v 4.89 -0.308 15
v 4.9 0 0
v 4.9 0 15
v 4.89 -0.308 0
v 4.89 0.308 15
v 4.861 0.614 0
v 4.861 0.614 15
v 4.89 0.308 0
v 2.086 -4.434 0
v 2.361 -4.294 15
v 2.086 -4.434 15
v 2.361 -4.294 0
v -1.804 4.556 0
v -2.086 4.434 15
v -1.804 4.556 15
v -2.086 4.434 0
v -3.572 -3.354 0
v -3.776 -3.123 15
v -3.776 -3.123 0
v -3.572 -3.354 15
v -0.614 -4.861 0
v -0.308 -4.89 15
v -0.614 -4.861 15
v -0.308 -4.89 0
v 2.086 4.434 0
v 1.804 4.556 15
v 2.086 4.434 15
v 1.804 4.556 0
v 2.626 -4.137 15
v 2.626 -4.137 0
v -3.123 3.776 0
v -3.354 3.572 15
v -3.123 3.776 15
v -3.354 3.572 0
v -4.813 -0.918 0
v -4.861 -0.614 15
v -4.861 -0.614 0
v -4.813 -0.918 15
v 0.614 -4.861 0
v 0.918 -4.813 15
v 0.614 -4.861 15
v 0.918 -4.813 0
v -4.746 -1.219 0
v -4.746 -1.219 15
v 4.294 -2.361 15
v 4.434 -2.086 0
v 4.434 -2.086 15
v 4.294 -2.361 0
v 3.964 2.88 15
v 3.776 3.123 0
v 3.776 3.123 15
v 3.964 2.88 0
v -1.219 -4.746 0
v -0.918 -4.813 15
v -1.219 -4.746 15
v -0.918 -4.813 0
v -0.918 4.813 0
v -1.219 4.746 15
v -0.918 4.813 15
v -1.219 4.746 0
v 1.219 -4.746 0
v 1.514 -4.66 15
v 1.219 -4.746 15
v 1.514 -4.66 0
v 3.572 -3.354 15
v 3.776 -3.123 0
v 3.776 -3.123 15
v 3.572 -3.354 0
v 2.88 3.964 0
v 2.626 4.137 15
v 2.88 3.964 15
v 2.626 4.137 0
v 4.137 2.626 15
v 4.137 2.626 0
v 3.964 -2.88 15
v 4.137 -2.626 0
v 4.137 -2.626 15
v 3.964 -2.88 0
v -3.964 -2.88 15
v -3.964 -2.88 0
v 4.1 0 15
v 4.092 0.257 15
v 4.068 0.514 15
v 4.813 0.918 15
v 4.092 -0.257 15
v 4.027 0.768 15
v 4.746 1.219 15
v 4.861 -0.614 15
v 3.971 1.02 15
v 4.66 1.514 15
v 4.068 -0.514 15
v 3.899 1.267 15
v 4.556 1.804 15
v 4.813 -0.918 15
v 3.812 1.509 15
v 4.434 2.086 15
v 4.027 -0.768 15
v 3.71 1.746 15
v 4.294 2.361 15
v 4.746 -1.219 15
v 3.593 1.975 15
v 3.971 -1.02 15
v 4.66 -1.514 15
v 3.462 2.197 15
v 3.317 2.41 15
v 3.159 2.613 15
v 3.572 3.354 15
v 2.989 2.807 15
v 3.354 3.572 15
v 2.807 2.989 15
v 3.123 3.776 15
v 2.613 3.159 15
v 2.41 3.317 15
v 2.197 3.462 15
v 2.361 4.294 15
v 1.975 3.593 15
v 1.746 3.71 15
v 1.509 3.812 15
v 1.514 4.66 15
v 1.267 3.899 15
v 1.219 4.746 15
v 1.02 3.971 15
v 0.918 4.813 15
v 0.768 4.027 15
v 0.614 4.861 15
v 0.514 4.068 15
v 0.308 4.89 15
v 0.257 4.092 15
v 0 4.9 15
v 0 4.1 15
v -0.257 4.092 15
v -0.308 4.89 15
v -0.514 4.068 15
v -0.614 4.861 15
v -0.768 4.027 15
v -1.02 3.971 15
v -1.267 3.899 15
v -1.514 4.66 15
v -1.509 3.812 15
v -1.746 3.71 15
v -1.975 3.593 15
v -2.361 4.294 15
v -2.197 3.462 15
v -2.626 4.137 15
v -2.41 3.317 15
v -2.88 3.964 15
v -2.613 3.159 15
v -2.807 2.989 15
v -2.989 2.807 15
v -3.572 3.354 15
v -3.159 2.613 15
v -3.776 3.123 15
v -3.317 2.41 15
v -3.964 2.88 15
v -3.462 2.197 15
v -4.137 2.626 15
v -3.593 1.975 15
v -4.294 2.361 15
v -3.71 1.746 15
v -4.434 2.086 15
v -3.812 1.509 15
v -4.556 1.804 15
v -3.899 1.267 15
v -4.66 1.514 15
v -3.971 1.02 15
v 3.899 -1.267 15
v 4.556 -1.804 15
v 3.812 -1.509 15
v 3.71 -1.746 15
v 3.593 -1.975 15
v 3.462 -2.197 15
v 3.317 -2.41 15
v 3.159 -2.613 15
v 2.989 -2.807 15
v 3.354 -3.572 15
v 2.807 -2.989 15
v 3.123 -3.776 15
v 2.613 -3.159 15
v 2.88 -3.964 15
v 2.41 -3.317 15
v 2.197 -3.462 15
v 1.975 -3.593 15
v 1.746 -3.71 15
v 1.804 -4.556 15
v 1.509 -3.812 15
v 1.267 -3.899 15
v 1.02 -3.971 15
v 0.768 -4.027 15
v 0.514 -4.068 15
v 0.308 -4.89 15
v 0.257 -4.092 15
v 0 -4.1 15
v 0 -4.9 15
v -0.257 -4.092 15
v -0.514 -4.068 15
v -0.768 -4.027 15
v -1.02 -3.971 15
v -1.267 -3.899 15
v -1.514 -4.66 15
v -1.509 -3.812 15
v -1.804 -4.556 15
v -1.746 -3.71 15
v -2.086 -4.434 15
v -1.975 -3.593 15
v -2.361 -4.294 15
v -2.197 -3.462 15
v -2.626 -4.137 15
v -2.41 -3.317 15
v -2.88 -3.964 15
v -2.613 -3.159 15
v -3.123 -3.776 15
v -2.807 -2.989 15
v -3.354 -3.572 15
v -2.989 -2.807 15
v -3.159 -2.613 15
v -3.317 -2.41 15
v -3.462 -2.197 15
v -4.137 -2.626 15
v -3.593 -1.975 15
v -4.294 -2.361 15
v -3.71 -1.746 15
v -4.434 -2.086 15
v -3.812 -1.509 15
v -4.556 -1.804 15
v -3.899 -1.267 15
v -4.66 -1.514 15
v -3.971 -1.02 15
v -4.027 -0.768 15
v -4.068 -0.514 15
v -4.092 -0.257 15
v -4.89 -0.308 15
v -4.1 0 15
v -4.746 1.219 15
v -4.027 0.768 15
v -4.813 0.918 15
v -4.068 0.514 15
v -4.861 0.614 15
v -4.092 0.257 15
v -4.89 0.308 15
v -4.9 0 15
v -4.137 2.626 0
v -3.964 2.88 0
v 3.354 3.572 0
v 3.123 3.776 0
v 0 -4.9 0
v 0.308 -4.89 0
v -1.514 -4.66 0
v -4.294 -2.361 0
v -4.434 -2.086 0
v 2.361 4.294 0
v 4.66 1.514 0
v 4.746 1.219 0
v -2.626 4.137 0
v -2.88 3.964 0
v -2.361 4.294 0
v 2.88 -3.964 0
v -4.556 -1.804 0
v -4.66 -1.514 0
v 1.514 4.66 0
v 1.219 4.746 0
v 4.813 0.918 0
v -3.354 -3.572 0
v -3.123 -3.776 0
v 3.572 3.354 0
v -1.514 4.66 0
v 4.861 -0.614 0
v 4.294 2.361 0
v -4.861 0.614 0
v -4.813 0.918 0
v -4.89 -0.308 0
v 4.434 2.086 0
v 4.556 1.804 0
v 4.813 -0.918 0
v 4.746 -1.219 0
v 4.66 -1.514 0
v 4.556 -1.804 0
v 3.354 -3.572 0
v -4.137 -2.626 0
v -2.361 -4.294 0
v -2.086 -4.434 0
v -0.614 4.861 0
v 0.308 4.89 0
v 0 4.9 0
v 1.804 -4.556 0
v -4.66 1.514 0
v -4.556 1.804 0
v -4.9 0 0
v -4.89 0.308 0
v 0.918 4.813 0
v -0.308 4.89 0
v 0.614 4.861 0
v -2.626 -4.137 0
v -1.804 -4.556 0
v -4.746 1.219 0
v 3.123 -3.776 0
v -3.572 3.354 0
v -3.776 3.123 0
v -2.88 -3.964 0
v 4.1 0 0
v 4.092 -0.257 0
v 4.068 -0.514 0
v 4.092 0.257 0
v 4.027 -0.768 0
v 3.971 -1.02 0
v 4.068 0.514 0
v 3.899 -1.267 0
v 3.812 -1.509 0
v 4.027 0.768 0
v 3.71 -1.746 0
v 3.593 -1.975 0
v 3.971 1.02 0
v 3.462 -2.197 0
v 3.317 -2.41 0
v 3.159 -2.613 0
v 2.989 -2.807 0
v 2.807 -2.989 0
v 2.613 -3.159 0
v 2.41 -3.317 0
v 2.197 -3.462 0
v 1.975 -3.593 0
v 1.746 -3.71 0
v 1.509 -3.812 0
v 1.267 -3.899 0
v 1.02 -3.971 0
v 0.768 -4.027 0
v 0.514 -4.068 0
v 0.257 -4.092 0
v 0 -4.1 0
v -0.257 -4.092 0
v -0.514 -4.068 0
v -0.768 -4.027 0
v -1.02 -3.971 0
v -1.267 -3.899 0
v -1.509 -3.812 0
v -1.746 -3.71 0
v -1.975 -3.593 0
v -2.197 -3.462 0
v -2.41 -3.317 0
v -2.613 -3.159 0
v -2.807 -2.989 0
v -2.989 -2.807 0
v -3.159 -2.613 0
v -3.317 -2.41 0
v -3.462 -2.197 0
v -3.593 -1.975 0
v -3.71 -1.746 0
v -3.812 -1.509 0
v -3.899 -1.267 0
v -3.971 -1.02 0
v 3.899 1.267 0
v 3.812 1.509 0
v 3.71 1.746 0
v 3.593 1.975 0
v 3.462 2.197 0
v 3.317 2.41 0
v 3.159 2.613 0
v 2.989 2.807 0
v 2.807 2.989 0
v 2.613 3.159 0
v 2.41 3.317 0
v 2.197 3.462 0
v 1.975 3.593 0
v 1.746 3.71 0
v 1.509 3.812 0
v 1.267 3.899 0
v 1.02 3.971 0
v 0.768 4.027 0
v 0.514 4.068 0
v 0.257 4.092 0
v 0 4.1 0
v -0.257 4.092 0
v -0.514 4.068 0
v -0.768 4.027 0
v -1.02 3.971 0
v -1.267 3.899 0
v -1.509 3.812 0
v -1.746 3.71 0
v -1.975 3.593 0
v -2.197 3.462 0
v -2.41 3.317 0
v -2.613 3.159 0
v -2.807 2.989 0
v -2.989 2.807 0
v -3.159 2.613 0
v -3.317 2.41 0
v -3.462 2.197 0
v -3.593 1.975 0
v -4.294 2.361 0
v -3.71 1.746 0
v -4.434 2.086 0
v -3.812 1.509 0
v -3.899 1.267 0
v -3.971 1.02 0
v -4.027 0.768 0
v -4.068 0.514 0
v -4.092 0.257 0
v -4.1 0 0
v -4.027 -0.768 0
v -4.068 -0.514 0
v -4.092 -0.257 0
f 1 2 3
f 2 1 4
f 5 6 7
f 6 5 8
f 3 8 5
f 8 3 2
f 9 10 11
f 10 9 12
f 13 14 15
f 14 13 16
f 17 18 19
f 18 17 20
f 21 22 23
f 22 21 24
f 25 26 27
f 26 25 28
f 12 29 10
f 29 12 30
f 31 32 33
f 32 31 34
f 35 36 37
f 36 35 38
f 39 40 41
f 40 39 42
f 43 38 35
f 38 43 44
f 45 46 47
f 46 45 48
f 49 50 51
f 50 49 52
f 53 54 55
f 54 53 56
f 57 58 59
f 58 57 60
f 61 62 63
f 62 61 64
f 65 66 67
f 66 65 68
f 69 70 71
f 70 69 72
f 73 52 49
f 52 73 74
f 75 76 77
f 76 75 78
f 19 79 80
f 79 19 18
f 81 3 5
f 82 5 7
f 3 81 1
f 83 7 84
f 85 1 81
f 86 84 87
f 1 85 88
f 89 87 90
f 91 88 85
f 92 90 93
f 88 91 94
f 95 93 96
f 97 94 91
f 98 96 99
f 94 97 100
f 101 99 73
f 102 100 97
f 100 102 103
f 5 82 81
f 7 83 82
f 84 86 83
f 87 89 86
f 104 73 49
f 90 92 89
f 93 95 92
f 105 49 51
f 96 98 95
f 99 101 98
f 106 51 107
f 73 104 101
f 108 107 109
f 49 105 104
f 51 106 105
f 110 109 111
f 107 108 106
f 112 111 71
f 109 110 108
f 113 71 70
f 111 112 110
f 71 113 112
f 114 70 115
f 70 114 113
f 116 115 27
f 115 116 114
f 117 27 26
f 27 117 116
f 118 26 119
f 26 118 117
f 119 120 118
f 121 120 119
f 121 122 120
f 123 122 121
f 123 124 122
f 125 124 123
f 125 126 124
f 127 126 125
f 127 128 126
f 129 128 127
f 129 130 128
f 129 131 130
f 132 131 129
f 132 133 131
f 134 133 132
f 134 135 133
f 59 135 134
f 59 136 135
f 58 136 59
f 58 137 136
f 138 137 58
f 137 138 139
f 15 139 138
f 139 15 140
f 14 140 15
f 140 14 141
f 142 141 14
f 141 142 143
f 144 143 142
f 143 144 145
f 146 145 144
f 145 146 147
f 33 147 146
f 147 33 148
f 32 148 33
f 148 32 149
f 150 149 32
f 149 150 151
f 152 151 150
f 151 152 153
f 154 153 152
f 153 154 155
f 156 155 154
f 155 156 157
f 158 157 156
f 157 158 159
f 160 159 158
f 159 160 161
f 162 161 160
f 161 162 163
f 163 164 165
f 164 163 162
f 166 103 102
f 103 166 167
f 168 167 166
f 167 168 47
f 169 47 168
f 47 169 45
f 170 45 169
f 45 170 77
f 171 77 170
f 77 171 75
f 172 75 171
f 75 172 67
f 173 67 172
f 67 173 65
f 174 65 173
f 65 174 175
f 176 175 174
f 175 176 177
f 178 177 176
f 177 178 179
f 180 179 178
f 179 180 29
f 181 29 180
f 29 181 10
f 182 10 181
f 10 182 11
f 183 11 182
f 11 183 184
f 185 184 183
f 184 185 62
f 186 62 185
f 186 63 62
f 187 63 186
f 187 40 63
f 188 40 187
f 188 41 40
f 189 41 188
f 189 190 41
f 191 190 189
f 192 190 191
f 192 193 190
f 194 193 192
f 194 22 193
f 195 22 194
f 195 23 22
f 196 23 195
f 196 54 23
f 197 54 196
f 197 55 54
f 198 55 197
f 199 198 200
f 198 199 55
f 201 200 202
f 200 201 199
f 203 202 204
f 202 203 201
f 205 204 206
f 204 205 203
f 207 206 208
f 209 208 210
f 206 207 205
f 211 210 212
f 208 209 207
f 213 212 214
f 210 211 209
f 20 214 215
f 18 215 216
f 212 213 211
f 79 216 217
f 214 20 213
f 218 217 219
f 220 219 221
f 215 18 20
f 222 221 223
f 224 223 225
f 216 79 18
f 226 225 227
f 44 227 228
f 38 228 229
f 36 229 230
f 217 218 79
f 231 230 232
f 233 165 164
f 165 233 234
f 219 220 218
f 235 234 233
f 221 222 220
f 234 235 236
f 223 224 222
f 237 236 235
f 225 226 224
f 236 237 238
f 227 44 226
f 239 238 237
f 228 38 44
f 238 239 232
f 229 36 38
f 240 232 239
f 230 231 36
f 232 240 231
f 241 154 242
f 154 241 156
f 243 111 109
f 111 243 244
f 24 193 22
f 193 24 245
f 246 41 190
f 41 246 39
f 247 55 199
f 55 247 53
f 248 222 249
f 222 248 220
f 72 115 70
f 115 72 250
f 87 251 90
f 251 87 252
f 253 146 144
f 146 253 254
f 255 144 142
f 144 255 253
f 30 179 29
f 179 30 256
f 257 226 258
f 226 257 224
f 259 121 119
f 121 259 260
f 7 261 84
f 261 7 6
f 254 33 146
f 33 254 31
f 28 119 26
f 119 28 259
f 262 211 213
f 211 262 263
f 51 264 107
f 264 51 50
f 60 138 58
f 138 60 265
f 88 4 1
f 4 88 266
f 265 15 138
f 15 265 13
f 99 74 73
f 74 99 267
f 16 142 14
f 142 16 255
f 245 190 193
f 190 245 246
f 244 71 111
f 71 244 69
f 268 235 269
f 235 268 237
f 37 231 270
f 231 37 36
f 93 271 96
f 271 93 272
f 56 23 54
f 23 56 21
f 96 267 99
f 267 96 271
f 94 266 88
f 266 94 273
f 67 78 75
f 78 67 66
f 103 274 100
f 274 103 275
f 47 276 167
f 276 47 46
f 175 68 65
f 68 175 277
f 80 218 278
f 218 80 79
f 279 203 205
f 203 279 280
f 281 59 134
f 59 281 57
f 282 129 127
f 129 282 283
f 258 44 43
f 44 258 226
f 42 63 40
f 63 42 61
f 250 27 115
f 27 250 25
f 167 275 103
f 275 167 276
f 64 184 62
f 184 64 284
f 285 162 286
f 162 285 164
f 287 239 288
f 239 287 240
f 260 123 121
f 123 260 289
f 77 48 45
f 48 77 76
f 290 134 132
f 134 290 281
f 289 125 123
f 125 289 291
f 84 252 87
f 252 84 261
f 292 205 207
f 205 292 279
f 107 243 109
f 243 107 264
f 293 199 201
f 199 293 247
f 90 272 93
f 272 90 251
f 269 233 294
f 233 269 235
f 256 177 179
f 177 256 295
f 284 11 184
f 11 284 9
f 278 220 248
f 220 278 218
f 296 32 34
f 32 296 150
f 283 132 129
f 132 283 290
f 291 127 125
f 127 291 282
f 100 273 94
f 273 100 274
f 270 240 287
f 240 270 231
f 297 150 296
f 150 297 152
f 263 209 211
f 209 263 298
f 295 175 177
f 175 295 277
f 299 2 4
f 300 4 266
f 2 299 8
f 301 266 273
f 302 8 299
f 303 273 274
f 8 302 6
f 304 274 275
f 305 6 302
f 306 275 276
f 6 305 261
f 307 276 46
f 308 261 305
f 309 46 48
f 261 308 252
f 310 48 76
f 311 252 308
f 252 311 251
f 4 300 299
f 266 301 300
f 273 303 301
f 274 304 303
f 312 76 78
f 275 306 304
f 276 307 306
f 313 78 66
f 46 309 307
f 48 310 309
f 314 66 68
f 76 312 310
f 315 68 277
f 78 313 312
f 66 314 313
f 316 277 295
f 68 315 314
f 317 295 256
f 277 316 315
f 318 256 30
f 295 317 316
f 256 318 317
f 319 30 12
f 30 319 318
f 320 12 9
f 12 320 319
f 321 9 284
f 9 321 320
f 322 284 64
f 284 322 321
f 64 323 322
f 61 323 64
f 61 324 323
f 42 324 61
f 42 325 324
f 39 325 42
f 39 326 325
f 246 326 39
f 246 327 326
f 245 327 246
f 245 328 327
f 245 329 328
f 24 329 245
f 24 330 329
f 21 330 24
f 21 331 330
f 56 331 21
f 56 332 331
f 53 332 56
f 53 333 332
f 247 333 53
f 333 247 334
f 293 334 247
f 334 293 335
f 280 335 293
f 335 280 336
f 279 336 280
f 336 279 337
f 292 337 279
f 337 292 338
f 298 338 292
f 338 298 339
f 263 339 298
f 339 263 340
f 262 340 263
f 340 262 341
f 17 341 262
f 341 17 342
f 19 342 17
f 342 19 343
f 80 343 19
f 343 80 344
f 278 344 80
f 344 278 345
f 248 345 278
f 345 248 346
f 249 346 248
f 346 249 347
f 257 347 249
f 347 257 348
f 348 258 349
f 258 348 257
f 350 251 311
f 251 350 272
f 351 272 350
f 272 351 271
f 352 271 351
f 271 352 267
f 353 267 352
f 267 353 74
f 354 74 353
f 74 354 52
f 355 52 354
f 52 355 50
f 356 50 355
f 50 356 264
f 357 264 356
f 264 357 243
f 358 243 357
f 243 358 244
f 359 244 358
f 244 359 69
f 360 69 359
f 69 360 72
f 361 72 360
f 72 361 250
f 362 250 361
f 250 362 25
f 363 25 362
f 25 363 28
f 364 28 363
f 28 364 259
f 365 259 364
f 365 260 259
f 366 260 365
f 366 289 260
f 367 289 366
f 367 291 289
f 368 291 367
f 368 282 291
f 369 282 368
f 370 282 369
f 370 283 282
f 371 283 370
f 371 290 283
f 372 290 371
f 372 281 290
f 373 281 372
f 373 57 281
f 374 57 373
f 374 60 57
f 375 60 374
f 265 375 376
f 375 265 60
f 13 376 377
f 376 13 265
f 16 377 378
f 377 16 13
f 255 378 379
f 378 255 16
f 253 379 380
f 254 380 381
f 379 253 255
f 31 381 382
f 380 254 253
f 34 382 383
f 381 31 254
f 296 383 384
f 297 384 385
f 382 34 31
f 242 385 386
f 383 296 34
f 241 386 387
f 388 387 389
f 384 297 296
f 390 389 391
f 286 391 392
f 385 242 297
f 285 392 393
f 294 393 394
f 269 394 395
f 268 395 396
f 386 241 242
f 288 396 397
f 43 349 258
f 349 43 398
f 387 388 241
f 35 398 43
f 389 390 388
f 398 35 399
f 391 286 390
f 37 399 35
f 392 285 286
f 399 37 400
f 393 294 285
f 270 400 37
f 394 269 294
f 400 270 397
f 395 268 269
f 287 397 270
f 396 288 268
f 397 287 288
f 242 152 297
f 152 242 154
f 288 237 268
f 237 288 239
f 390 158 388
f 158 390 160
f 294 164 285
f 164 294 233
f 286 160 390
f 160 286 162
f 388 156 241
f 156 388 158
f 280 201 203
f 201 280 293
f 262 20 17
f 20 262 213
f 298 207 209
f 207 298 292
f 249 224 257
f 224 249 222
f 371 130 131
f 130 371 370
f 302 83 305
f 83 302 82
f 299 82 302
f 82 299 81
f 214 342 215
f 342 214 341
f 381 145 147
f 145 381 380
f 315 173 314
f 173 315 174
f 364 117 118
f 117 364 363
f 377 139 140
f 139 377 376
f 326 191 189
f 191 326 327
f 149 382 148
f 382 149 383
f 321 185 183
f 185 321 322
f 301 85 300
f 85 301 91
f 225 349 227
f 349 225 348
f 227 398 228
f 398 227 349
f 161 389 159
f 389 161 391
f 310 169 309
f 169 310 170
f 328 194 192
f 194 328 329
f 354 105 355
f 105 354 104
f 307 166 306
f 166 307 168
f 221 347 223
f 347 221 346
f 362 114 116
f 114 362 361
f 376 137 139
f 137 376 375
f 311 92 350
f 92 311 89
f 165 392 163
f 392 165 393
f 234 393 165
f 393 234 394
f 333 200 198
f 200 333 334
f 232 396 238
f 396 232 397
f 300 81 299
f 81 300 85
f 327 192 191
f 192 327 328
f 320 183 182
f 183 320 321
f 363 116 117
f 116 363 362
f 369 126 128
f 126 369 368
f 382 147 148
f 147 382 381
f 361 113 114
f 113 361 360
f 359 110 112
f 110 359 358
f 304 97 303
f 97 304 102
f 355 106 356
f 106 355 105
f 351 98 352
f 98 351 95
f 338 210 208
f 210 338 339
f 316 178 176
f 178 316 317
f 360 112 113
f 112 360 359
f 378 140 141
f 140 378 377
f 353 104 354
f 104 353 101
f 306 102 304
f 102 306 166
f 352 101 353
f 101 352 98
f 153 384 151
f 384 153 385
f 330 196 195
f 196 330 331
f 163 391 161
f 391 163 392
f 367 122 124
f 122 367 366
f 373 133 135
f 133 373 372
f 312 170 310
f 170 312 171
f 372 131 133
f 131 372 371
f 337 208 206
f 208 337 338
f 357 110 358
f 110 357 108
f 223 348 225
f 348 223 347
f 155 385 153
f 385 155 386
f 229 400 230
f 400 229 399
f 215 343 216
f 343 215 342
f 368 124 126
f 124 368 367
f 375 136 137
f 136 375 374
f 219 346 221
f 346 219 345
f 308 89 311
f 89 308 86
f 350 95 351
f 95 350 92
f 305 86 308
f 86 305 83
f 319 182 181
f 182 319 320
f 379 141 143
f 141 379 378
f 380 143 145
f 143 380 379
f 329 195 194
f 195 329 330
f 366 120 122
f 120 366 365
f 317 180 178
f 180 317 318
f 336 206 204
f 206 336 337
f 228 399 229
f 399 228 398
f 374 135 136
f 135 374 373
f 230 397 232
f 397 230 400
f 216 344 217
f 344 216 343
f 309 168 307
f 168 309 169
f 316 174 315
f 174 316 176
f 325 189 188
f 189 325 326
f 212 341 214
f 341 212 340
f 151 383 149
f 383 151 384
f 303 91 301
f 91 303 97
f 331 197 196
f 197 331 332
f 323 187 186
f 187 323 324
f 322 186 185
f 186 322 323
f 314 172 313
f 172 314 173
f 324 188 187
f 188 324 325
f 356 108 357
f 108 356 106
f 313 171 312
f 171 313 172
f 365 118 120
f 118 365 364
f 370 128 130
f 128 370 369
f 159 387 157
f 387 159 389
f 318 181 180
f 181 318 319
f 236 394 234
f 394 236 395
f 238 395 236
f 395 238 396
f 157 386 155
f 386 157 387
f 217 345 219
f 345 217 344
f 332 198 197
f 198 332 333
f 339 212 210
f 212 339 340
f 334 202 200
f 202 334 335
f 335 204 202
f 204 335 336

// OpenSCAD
// inner diameter (e.g. lead screw diameter)
d_inner=8;
// outer diameter (i.e. existing coupler inner diameter)
d_outer=10;
// height of adapter (can scale in slicer too)
h = 15;

// inner tolerance in mm (substract from wall)
i_inner = 0.2;
// outer tolerance in mm (substract from wall)
i_outer = 0.2;

difference() {
    cylinder(d=d_outer-i_outer, h=h, $fn=100);
    
    translate([0,0,-1]) {
        cylinder(d=d_inner+i_inner, h=h+2, $fn=100);
    }
}


echo ((d_outer-d_inner-i_outer-i_inner)/2, "mm");
